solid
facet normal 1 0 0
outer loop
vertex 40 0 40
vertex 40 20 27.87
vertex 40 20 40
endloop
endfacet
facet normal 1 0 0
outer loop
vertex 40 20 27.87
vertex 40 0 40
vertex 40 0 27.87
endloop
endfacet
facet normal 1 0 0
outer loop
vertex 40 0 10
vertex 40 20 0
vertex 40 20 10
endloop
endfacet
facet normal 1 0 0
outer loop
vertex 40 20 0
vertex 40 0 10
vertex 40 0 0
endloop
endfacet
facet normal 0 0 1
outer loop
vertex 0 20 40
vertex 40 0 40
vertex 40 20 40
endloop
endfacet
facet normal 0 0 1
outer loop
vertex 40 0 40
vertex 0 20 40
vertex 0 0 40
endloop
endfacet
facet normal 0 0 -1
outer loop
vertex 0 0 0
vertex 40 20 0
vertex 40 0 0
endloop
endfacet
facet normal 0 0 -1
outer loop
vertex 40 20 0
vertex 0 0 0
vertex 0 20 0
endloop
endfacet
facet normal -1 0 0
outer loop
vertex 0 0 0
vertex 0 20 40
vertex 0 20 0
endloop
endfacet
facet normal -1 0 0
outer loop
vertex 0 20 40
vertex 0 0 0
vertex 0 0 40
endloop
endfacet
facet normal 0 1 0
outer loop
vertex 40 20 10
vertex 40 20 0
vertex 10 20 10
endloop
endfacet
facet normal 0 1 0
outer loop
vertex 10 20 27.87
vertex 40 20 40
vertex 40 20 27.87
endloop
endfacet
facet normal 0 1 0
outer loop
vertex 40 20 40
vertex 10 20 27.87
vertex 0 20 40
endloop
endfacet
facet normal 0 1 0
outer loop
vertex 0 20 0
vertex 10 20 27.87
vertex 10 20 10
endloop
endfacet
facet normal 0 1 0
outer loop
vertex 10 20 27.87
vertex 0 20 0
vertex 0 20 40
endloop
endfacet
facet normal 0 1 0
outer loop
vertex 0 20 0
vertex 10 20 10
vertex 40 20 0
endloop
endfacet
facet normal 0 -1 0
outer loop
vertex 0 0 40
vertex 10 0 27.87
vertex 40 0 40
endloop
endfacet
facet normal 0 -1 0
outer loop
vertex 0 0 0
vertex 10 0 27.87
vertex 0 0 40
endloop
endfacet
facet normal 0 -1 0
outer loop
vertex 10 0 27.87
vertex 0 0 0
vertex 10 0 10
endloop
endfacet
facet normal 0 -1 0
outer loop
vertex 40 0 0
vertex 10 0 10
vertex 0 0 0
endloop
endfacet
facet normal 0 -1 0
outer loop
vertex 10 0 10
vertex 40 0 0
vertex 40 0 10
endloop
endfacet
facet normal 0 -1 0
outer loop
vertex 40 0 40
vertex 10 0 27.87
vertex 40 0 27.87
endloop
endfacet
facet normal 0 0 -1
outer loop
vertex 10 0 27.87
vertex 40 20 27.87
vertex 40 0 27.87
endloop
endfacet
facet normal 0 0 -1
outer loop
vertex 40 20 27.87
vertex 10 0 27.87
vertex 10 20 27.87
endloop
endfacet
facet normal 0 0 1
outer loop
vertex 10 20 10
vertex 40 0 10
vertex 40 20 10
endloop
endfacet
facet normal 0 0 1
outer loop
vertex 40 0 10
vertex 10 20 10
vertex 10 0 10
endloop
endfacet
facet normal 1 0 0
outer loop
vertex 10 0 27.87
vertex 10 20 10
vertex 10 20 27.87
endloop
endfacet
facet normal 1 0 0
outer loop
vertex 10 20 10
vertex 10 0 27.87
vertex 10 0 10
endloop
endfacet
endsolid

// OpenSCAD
difference(){
cube([40,20,40]);
translate([10,-1,10])
cube([42,22,17.87]);
}
